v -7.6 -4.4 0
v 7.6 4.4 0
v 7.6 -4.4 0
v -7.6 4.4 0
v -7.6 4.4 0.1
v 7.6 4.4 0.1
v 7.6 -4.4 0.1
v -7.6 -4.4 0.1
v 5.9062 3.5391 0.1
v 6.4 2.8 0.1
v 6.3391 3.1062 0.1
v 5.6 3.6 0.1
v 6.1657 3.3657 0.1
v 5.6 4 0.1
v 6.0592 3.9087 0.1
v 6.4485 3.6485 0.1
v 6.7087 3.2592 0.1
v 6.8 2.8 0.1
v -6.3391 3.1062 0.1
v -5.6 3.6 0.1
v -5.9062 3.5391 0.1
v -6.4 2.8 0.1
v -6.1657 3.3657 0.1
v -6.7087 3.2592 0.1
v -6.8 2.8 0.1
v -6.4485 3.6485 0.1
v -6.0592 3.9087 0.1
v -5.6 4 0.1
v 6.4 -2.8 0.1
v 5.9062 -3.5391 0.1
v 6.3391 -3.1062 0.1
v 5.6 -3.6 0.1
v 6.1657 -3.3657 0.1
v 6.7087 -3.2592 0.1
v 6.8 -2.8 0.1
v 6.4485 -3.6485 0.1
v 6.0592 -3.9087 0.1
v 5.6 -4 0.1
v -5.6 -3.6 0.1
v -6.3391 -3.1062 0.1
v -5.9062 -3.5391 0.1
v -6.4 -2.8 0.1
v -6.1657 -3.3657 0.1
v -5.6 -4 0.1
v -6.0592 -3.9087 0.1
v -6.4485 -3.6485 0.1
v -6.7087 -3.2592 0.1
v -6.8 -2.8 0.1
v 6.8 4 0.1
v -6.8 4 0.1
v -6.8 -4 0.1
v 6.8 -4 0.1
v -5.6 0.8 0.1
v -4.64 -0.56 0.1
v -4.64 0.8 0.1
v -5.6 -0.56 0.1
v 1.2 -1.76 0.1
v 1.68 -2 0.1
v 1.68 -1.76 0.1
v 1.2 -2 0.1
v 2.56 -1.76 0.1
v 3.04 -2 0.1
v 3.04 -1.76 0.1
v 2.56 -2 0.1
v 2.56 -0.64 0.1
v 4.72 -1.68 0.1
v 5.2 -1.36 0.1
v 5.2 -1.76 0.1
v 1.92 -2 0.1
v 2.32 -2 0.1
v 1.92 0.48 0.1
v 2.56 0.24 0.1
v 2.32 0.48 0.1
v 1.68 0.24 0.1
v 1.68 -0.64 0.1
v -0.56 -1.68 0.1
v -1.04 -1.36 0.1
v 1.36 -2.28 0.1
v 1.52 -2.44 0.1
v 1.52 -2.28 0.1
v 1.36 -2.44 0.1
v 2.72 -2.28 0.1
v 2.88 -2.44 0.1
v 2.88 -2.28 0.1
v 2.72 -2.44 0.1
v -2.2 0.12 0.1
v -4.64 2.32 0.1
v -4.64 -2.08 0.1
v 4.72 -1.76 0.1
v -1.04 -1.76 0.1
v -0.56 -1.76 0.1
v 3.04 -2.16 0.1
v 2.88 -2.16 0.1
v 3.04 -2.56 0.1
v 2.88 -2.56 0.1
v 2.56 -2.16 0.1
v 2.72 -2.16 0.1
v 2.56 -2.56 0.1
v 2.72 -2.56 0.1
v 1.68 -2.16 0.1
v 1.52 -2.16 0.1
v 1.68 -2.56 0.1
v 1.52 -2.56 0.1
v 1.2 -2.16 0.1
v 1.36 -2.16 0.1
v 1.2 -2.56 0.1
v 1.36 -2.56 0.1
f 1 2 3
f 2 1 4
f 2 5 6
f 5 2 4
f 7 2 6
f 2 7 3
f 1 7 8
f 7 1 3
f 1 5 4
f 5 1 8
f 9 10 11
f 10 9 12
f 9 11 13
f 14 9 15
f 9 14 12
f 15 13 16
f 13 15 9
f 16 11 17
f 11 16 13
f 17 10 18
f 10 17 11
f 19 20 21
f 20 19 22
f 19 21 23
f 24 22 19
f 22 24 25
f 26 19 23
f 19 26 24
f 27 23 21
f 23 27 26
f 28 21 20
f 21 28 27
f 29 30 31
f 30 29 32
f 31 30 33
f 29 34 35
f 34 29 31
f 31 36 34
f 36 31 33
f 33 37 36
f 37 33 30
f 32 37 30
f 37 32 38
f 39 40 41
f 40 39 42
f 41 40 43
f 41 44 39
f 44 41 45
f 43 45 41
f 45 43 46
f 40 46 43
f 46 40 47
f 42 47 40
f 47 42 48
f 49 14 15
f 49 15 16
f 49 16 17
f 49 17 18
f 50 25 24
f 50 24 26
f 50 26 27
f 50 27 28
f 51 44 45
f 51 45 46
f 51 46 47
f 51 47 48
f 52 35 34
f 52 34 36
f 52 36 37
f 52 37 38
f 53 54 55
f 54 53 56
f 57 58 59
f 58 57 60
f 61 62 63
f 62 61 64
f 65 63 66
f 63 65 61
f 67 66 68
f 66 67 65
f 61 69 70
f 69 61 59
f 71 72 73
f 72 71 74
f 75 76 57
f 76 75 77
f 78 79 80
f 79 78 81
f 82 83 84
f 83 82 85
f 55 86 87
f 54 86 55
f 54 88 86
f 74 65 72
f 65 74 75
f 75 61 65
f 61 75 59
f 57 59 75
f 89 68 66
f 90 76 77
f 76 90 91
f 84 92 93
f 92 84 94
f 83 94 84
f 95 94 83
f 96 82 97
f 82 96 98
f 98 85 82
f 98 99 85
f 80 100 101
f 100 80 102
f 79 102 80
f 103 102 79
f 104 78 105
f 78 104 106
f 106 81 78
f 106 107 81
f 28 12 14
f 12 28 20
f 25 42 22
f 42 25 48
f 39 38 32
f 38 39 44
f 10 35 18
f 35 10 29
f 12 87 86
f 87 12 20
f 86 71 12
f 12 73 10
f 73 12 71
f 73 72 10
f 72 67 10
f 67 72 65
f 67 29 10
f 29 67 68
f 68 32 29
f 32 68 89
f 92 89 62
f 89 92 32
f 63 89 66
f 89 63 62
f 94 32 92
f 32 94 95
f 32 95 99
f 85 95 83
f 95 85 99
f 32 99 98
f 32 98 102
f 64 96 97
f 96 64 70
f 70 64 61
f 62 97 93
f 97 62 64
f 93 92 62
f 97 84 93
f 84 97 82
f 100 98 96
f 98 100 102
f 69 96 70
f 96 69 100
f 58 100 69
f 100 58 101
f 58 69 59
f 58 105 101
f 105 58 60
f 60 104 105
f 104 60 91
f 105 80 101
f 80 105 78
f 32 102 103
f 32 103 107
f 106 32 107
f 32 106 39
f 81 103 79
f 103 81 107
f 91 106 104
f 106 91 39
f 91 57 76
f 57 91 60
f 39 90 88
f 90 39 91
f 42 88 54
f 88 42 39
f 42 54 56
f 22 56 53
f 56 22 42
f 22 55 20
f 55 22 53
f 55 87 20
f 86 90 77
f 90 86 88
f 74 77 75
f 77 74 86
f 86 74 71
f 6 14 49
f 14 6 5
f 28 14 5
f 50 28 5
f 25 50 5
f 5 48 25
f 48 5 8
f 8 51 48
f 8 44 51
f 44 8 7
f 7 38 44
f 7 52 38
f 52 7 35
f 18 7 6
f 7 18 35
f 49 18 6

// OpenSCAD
// file: ../p/box5-12.scad
use <../lib.scad>
function ldraw_lib__box5_12() = [
// 0 Box with 5 Faces without Any Edges
// 0 Name: box5-12.dat
// 0 Author: Chris Dee [cwdee]
// 0 !LDRAW_ORG Primitive UPDATE 2009-02
// 0 !LICENSE Licensed under CC BY 2.0 and CC BY 4.0 : see CAreadme.txt
// 
// 0 BFC CERTIFY CCW
  [0,"BFC","CERTIFY"],
  [0,"BFC","CCW"],
// 
// 0 !HISTORY 2009-09-03 [PTadmin] Official Update 2009-02
// 
// 
// 4 16 1 1 1 1 1 -1 -1 1 -1 -1 1 1
  [4,16,1,1,1,1,1,-1,-1,1,-1,-1,1,1],
// 4 16 -1 0 1 1 0 1 1 1 1 -1 1 1
  [4,16,-1,0,1,1,0,1,1,1,1,-1,1,1],
// 4 16 -1 0 -1 -1 0 1 -1 1 1 -1 1 -1
  [4,16,-1,0,-1,-1,0,1,-1,1,1,-1,1,-1],
// 4 16 1 0 -1 -1 0 -1 -1 1 -1 1 1 -1
  [4,16,1,0,-1,-1,0,-1,-1,1,-1,1,1,-1],
// 4 16 1 0 1 1 0 -1 1 1 -1 1 1 1
  [4,16,1,0,1,1,0,-1,1,1,-1,1,1,1],
// 0
];
makepoly(ldraw_lib__box5_12(), line=0.2);
// file: ../p/1-4ring2.scad
use <../lib.scad>
function ldraw_lib__1_4ring2() = [
// 0 Ring  2 x 0.25
// 0 Name: 1-4ring2.dat
// 0 Author: Franklin W. Cain [fwcain]
// 0 !LDRAW_ORG Primitive UPDATE 2015-01
// 0 !LICENSE Licensed under CC BY 2.0 and CC BY 4.0 : see CAreadme.txt
// 
// 0 BFC CERTIFY CCW
  [0,"BFC","CERTIFY"],
  [0,"BFC","CCW"],
// 
// 0 !HISTORY 2001-12-31 [PTadmin] Official Update 2001-03
// 0 !HISTORY 2007-06-22 [PTadmin] Header formatted for Contributor Agreement
// 0 !HISTORY 2008-07-01 [PTadmin] Official Update 2008-01
// 0 !HISTORY 2012-02-16 [Philo] Changed to CCW
// 0 !HISTORY 2012-03-30 [PTadmin] Official Update 2012-01
// 0 !HISTORY 2014-12-25 [MMR1988] Fixed a rounding issue
// 0 !HISTORY 2015-10-11 [PTadmin] Official Update 2015-01
// 
// 
// 4 16 3 0 0 2.7717 0 1.1481 1.8478 0 0.7654 2 0 0
  [4,16,3,0,0,2.7717,0,1.1481,1.8478,0,0.7654,2,0,0],
// 4 16 2.7717 0 1.1481 2.1213 0 2.1213 1.4142 0 1.4142 1.8478 0 0.7654
  [4,16,2.7717,0,1.1481,2.1213,0,2.1213,1.4142,0,1.4142,1.8478,0,0.7654],
// 4 16 2.1213 0 2.1213 1.1481 0 2.7717 0.7654 0 1.8478 1.4142 0 1.4142
  [4,16,2.1213,0,2.1213,1.1481,0,2.7717,0.7654,0,1.8478,1.4142,0,1.4142],
// 4 16 1.1481 0 2.7717 0 0 3 0 0 2 0.7654 0 1.8478
  [4,16,1.1481,0,2.7717,0,0,3,0,0,2,0.7654,0,1.8478],
// 0 // Build by Primitive Generator 2
];
makepoly(ldraw_lib__1_4ring2(), line=0.2);
// file: ../p/1-4ndis.scad
use <../lib.scad>
function ldraw_lib__1_4ndis() = [
// 0 Disc Negative 0.25
// 0 Name: 1-4ndis.dat
// 0 Author: James Jessiman
// 0 !LDRAW_ORG Primitive UPDATE 2012-01
// 0 !LICENSE Licensed under CC BY 2.0 and CC BY 4.0 : see CAreadme.txt
// 
// 0 BFC CERTIFY CCW
  [0,"BFC","CERTIFY"],
  [0,"BFC","CCW"],
// 
// 0 !HISTORY 2002-03-23 [sbliss] Added BFC Statement
// 0 !HISTORY 2002-04-25 [PTadmin] Official Update 2002-02
// 0 !HISTORY 2007-06-22 [PTadmin] Header formatted for Contributor Agreement
// 0 !HISTORY 2008-07-01 [PTadmin] Official Update 2008-01
// 0 !HISTORY 2012-02-16 [Philo] Changed to CCW
// 0 !HISTORY 2012-03-30 [PTadmin] Official Update 2012-01
// 
// 
// 3 16 0.9239 0 0.3827 1 0 0 1 0 1
  [3,16,0.9239,0,0.3827,1,0,0,1,0,1],
// 3 16 0.7071 0 0.7071 0.9239 0 0.3827 1 0 1
  [3,16,0.7071,0,0.7071,0.9239,0,0.3827,1,0,1],
// 3 16 0.3827 0 0.9239 0.7071 0 0.7071 1 0 1
  [3,16,0.3827,0,0.9239,0.7071,0,0.7071,1,0,1],
// 3 16 0 0 1 0.3827 0 0.9239 1 0 1
  [3,16,0,0,1,0.3827,0,0.9239,1,0,1],
];
makepoly(ldraw_lib__1_4ndis(), line=0.2);
// file: ../p/1-4chrd.scad
use <../lib.scad>
function ldraw_lib__1_4chrd() = [
// 0 Chord 0.25
// 0 Name: 1-4chrd.dat
// 0 Author: Tony Hafner [hafhead]
// 0 !LDRAW_ORG Primitive UPDATE 2012-02
// 0 !LICENSE Licensed under CC BY 2.0 and CC BY 4.0 : see CAreadme.txt
// 
// 0 BFC CERTIFY CCW
  [0,"BFC","CERTIFY"],
  [0,"BFC","CCW"],
// 
// 0 !HISTORY 2004-04-22 [PTadmin] Official Update 2004-02
// 0 !HISTORY 2007-10-09 [PTadmin] Header formatted for Contributor Agreement
// 0 !HISTORY 2008-07-01 [PTadmin] Official Update 2008-01
// 0 !HISTORY 2012-08-02 [MMR1988] Re-creation with PrimGen2 and Rectifier
// 0 !HISTORY 2012-08-09 [PTadmin] Official Update 2012-02
// 
// 
// 4 16 0.9239 0 0.3827 0.3827 0 0.9239 0 0 1 1 0 0
  [4,16,0.9239,0,0.3827,0.3827,0,0.9239,0,0,1,1,0,0],
// 3 16 0.7071 0 0.7071 0.3827 0 0.9239 0.9239 0 0.3827
  [3,16,0.7071,0,0.7071,0.3827,0,0.9239,0.9239,0,0.3827],
];
makepoly(ldraw_lib__1_4chrd(), line=0.2);
// main file
use <../lib.scad>
use <163156c.scad>
function ldraw_lib__163156d() = [
// 0 Sticker  1.1 x  1.9 with Town Airport Direction Signs - Right
// 0 Name: 163156d.dat
// 0 Author: Takeshi Takahashi [RainbowDolphin]
// 0 !LDRAW_ORG Part UPDATE 2020-03
// 0 !LICENSE Licensed under CC BY 2.0 and CC BY 4.0 : see CAreadme.txt
// 
// 0 BFC CERTIFY CCW
  [0,"BFC","CERTIFY"],
  [0,"BFC","CCW"],
// 
// 0 !KEYWORDS set 6396
// 
// 0 !HISTORY 2018-01-08 [bercik] OMR version by Robert Paciorek [bercik] with permission of Zoltank82
// 0 !HISTORY 2020-06-24 [RainbowDolphin] File preparation for LDraw Parts Tracker
// 0 !HISTORY 2020-12-29 [PTadmin] Official Update 2020-03
// 
// 
// 1 16 0 0 0 -1 0 0 0 1 0 0 0 1 163156c.dat
  [1,16,0,0,0,-1,0,0,0,1,0,0,0,1, ldraw_lib__163156c()],
];
makepoly(ldraw_lib__163156d(), line=0.2);
